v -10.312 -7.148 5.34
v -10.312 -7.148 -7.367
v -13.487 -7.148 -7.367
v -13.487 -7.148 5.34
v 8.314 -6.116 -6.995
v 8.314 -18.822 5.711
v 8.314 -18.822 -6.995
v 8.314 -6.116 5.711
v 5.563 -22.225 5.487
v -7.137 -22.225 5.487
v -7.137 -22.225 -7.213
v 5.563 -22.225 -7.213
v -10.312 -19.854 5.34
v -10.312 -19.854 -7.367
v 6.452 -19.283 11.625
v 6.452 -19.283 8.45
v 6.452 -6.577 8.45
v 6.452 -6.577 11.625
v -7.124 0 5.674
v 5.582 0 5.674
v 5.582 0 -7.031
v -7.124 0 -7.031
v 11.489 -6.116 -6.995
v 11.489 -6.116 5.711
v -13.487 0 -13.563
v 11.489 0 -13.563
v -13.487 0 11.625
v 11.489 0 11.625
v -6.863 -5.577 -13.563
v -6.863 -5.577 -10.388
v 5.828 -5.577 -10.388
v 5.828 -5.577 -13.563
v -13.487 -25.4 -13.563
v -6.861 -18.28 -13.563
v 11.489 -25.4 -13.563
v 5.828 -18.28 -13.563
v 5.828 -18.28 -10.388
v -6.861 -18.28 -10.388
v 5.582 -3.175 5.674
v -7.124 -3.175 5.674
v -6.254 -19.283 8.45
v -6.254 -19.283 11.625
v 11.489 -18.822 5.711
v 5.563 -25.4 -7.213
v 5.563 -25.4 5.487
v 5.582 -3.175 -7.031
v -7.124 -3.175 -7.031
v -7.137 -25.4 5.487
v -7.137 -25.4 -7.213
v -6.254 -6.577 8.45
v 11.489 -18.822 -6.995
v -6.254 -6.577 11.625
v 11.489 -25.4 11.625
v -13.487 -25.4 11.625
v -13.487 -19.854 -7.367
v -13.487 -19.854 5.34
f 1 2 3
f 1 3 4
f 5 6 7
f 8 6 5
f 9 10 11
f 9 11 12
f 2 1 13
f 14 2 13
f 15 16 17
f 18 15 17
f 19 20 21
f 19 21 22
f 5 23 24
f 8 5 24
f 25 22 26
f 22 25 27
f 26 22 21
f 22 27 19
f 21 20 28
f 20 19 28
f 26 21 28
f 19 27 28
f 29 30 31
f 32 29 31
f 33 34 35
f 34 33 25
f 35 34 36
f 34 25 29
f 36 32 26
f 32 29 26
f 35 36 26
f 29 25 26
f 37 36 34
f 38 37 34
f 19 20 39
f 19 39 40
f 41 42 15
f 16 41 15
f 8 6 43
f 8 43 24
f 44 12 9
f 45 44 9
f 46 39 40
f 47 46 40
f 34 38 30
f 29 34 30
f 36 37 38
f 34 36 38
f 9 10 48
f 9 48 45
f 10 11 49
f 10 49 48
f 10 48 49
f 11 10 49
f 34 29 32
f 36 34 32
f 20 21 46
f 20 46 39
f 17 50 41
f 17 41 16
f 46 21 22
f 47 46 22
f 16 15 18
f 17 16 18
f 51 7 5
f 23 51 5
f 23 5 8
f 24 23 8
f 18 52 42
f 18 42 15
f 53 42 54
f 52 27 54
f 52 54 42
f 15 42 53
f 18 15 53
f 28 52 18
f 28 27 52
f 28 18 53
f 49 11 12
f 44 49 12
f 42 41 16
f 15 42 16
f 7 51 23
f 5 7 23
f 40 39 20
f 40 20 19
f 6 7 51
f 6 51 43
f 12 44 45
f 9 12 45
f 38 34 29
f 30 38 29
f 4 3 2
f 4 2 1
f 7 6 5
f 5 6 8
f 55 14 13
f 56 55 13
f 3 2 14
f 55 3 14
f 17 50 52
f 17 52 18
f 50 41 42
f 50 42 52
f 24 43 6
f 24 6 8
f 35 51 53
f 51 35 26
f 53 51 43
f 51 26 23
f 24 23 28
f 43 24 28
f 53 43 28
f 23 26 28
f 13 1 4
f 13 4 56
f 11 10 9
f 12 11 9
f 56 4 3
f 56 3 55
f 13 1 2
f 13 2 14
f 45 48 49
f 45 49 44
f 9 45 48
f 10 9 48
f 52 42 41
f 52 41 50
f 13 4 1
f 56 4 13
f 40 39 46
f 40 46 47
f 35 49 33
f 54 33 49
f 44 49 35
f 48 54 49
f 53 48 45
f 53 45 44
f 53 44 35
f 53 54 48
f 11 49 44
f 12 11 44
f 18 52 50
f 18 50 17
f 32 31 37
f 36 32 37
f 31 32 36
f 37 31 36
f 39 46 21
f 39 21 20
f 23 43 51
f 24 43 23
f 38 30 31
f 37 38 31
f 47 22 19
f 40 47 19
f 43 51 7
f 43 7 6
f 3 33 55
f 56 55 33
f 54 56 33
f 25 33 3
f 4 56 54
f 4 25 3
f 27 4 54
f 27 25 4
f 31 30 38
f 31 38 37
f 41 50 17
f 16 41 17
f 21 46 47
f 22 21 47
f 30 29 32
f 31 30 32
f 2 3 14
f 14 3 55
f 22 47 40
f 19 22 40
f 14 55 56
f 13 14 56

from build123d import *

# Parameters (mm, degrees)
F0_W      = 24.9766653881
F0_H      = 25.1883340639
F1_DEPTH  = 25.4
F3_DEPTH  = 3.175
F4_W      = 12.7057791688
F4_H      = 12.7057782374
F5_DEPTH  = 3.175
F6_W      = 12.7057782374
F6_H      = 12.7057782374
F7_DEPTH  = 3.175
F8_W      = 12.7057782374
F8_H      = 12.7057787031
F9_DEPTH  = 3.175
F10_W     = 12.7056017518
F10_H     = 12.7069917507
F11_DEPTH = 3.175
F13_DEPTH = 3.175
F14_W     = 12.7
F14_H     = 12.7
F15_DEPTH = 3.175
F16_W     = 12.7057791688
F16_H     = 12.7057782374
F17_DEPTH = 3.175
F18_W     = 12.7057782374
F18_H     = 12.7057782374
F19_DEPTH = 3.175
F20_DEPTH = 3.175
F21_W     = 12.7056017518
F21_H     = 12.7069917507
F22_DEPTH = 3.175
F24_DEPTH = 3.175


with BuildPart() as f1:
    # F0 (on Front) → F1 (new body)
    with BuildSketch(Plane.XZ):
        with Locations((-0.9989441171, -0.9692509511)):
            Rectangle(F0_W, F0_H)
    extrude(amount=F1_DEPTH)

    # F2 (on face) → F3 (cut)
    with BuildSketch(Plane.XZ.offset(25.4)):
        Polygon((5.5627231889, 5.4865820169), (-7.1372768111, 5.4865820169), (-7.1372768111, 0), (-7.1372768111, -7.2134179831), (5.5627231889, -7.2134179831), align=None)
    extrude(amount=-F3_DEPTH, mode=Mode.SUBTRACT)

    # F4 (on face) → F5 (cut)
    with BuildSketch(Plane.YZ.offset(11.489388577)):
        with Locations((-12.4690427911, -0.641859835)):
            Rectangle(F4_W, F4_H)
    extrude(amount=-F5_DEPTH, mode=Mode.SUBTRACT)

    # F6 (on face) → F7 (cut)
    with BuildSketch(Plane.XY.offset(11.6249160809)):
        with Locations((0.0989704859, -12.9297275562)):
            Rectangle(F6_W, F6_H)
    extrude(amount=-F7_DEPTH, mode=Mode.SUBTRACT)

    # F8 (on face) → F9 (cut)
    with BuildSketch(Plane(origin=(0, 0, 0), x_dir=(-1, 0, 0), z_dir=(0, 1, 0))):
        with Locations((0.7706631441, -0.6784405559)):
            Rectangle(F8_W, F8_H)
    extrude(amount=-F9_DEPTH, mode=Mode.SUBTRACT)

    # F10 (on face) → F11 (cut)
    with BuildSketch(Plane(origin=(-13.4872768111, 0, 0), x_dir=(0, -1, 0), z_dir=(-1, 0, 0))):
        with Locations((13.5012548417, -1.0135585908)):
            Rectangle(F10_W, F10_H)
    extrude(amount=-F11_DEPTH, mode=Mode.SUBTRACT)

    # F12 (on face) → F13 (cut)
    with BuildSketch(Plane(origin=(0, 0, -13.5634179831), x_dir=(1, 0, 0), z_dir=(0, 0, -1))):
        Polygon((5.8278664947, 18.2796437293), (-6.860839203, 18.2796437293), (-6.8629896268, 5.5769057944), (5.8278664947, 5.5769057944), align=None)
    extrude(amount=-F13_DEPTH, mode=Mode.SUBTRACT)


with BuildPart() as f15:
    # F14 (on face) → F15 (new body)
    with BuildSketch(Plane.XZ.offset(22.225)):
        with Locations((-0.7872768111, -0.8634179831)):
            Rectangle(F14_W, F14_H)
    extrude(amount=F15_DEPTH)


with BuildPart() as f17:
    # F16 (on face) → F17 (new body)
    with BuildSketch(Plane.YZ.offset(8.314388577)):
        with Locations((-12.4690427911, -0.641859835)):
            Rectangle(F16_W, F16_H)
    extrude(amount=F17_DEPTH)


with BuildPart() as f19:
    # F18 (on face) → F19 (new body)
    with BuildSketch(Plane.XY.offset(8.4499160809)):
        with Locations((0.0989704859, -12.9297275562)):
            Rectangle(F18_W, F18_H)
    extrude(amount=F19_DEPTH)


with BuildPart() as f20:
    # F20 (new): a face of the model
    f20_faces = [f1.part.faces().sort_by_distance(p)[0] for p in [
        (-0.7706631441, -3.175, -0.6784405559),
    ]]
    extrude(f20_faces, amount=F20_DEPTH)


with BuildPart() as f22:
    # F21 (on face) → F22 (new body)
    with BuildSketch(Plane(origin=(-10.3122768111, 0, 0), x_dir=(0, -1, 0), z_dir=(-1, 0, 0))):
        with Locations((13.5012548417, -1.0135585908)):
            Rectangle(F21_W, F21_H)
    extrude(amount=F22_DEPTH)


with BuildPart() as f24:
    # F23 (on face) → F24 (new body)
    with BuildSketch(Plane(origin=(0, 0, -10.3884179831), x_dir=(1, 0, 0), z_dir=(0, 0, -1))):
        Polygon((-6.860839203, 18.2796437293), (-6.8629896268, 5.5769057944), (5.8278664947, 5.5769057944), (5.8278664947, 18.2796437293), align=None)
    extrude(amount=F24_DEPTH)


solid = Compound([f1.part, f15.part, f17.part, f19.part, f20.part, f22.part, f24.part])
